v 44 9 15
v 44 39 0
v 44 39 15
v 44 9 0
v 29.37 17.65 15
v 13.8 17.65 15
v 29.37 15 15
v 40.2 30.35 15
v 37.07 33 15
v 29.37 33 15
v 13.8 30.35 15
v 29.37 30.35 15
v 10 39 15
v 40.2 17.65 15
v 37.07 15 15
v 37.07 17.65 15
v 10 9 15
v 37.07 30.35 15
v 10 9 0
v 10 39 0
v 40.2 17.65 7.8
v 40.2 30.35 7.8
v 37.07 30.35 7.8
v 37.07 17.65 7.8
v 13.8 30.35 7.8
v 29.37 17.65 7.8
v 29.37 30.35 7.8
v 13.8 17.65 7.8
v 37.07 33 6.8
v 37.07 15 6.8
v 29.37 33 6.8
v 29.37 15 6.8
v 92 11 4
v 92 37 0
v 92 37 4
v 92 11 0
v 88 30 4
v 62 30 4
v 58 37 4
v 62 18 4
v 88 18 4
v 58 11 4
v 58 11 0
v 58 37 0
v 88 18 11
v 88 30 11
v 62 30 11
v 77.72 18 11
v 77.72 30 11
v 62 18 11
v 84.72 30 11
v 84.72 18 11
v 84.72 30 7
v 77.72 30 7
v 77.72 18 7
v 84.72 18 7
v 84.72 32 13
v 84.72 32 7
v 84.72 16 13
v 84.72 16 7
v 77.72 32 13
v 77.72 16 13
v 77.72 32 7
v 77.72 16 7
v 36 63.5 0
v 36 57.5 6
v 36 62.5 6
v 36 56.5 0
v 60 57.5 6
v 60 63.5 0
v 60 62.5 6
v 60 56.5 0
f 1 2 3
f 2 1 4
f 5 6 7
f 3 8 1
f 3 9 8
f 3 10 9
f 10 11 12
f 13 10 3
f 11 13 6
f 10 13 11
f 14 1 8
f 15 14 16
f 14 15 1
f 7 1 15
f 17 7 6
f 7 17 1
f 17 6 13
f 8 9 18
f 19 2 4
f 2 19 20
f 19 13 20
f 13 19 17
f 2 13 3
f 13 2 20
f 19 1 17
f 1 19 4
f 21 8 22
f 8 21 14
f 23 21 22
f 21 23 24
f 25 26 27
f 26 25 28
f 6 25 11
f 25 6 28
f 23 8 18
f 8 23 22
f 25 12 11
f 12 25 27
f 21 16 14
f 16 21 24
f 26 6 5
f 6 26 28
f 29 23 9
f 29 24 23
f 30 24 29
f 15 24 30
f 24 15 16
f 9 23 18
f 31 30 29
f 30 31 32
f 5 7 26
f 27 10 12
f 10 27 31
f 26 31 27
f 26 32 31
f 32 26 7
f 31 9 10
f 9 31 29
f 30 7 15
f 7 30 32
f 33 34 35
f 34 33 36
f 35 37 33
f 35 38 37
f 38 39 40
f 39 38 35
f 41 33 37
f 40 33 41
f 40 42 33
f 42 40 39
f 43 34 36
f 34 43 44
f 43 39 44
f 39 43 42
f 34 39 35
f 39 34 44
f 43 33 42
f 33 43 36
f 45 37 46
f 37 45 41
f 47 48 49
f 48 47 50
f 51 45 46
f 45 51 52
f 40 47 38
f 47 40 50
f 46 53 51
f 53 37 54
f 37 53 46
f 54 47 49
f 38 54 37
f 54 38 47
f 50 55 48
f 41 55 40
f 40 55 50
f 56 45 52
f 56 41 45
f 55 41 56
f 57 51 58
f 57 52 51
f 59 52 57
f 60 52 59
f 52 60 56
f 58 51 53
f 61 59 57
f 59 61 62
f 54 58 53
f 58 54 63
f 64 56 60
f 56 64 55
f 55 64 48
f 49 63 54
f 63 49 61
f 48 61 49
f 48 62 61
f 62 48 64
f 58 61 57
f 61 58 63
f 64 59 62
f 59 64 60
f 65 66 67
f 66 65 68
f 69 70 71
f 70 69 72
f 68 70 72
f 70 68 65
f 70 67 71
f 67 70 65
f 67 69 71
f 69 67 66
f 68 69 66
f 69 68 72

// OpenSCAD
/*
Sample 055: Nut-Feder-Verbindung mit Querkeil — 0,35 mm
Generated from the FDM Mechanical Sample Library.
Units: millimetres.

Override examples:
  openscad -o custom.stl -D 'view="plate"' -D 'render_fn=64' model.scad
  openscad -o preview.png -D 'view="assembly"' model.scad
*/
use <../../../library/fdm_mechanisms.scad>

render_fn = is_undef(render_fn) ? 48 : render_fn;
view = is_undef(view) ? "plate" : view;
$fn = render_fn;

sample_wedge_lock_joint(
    view=view,
    clearance=0.35
);
